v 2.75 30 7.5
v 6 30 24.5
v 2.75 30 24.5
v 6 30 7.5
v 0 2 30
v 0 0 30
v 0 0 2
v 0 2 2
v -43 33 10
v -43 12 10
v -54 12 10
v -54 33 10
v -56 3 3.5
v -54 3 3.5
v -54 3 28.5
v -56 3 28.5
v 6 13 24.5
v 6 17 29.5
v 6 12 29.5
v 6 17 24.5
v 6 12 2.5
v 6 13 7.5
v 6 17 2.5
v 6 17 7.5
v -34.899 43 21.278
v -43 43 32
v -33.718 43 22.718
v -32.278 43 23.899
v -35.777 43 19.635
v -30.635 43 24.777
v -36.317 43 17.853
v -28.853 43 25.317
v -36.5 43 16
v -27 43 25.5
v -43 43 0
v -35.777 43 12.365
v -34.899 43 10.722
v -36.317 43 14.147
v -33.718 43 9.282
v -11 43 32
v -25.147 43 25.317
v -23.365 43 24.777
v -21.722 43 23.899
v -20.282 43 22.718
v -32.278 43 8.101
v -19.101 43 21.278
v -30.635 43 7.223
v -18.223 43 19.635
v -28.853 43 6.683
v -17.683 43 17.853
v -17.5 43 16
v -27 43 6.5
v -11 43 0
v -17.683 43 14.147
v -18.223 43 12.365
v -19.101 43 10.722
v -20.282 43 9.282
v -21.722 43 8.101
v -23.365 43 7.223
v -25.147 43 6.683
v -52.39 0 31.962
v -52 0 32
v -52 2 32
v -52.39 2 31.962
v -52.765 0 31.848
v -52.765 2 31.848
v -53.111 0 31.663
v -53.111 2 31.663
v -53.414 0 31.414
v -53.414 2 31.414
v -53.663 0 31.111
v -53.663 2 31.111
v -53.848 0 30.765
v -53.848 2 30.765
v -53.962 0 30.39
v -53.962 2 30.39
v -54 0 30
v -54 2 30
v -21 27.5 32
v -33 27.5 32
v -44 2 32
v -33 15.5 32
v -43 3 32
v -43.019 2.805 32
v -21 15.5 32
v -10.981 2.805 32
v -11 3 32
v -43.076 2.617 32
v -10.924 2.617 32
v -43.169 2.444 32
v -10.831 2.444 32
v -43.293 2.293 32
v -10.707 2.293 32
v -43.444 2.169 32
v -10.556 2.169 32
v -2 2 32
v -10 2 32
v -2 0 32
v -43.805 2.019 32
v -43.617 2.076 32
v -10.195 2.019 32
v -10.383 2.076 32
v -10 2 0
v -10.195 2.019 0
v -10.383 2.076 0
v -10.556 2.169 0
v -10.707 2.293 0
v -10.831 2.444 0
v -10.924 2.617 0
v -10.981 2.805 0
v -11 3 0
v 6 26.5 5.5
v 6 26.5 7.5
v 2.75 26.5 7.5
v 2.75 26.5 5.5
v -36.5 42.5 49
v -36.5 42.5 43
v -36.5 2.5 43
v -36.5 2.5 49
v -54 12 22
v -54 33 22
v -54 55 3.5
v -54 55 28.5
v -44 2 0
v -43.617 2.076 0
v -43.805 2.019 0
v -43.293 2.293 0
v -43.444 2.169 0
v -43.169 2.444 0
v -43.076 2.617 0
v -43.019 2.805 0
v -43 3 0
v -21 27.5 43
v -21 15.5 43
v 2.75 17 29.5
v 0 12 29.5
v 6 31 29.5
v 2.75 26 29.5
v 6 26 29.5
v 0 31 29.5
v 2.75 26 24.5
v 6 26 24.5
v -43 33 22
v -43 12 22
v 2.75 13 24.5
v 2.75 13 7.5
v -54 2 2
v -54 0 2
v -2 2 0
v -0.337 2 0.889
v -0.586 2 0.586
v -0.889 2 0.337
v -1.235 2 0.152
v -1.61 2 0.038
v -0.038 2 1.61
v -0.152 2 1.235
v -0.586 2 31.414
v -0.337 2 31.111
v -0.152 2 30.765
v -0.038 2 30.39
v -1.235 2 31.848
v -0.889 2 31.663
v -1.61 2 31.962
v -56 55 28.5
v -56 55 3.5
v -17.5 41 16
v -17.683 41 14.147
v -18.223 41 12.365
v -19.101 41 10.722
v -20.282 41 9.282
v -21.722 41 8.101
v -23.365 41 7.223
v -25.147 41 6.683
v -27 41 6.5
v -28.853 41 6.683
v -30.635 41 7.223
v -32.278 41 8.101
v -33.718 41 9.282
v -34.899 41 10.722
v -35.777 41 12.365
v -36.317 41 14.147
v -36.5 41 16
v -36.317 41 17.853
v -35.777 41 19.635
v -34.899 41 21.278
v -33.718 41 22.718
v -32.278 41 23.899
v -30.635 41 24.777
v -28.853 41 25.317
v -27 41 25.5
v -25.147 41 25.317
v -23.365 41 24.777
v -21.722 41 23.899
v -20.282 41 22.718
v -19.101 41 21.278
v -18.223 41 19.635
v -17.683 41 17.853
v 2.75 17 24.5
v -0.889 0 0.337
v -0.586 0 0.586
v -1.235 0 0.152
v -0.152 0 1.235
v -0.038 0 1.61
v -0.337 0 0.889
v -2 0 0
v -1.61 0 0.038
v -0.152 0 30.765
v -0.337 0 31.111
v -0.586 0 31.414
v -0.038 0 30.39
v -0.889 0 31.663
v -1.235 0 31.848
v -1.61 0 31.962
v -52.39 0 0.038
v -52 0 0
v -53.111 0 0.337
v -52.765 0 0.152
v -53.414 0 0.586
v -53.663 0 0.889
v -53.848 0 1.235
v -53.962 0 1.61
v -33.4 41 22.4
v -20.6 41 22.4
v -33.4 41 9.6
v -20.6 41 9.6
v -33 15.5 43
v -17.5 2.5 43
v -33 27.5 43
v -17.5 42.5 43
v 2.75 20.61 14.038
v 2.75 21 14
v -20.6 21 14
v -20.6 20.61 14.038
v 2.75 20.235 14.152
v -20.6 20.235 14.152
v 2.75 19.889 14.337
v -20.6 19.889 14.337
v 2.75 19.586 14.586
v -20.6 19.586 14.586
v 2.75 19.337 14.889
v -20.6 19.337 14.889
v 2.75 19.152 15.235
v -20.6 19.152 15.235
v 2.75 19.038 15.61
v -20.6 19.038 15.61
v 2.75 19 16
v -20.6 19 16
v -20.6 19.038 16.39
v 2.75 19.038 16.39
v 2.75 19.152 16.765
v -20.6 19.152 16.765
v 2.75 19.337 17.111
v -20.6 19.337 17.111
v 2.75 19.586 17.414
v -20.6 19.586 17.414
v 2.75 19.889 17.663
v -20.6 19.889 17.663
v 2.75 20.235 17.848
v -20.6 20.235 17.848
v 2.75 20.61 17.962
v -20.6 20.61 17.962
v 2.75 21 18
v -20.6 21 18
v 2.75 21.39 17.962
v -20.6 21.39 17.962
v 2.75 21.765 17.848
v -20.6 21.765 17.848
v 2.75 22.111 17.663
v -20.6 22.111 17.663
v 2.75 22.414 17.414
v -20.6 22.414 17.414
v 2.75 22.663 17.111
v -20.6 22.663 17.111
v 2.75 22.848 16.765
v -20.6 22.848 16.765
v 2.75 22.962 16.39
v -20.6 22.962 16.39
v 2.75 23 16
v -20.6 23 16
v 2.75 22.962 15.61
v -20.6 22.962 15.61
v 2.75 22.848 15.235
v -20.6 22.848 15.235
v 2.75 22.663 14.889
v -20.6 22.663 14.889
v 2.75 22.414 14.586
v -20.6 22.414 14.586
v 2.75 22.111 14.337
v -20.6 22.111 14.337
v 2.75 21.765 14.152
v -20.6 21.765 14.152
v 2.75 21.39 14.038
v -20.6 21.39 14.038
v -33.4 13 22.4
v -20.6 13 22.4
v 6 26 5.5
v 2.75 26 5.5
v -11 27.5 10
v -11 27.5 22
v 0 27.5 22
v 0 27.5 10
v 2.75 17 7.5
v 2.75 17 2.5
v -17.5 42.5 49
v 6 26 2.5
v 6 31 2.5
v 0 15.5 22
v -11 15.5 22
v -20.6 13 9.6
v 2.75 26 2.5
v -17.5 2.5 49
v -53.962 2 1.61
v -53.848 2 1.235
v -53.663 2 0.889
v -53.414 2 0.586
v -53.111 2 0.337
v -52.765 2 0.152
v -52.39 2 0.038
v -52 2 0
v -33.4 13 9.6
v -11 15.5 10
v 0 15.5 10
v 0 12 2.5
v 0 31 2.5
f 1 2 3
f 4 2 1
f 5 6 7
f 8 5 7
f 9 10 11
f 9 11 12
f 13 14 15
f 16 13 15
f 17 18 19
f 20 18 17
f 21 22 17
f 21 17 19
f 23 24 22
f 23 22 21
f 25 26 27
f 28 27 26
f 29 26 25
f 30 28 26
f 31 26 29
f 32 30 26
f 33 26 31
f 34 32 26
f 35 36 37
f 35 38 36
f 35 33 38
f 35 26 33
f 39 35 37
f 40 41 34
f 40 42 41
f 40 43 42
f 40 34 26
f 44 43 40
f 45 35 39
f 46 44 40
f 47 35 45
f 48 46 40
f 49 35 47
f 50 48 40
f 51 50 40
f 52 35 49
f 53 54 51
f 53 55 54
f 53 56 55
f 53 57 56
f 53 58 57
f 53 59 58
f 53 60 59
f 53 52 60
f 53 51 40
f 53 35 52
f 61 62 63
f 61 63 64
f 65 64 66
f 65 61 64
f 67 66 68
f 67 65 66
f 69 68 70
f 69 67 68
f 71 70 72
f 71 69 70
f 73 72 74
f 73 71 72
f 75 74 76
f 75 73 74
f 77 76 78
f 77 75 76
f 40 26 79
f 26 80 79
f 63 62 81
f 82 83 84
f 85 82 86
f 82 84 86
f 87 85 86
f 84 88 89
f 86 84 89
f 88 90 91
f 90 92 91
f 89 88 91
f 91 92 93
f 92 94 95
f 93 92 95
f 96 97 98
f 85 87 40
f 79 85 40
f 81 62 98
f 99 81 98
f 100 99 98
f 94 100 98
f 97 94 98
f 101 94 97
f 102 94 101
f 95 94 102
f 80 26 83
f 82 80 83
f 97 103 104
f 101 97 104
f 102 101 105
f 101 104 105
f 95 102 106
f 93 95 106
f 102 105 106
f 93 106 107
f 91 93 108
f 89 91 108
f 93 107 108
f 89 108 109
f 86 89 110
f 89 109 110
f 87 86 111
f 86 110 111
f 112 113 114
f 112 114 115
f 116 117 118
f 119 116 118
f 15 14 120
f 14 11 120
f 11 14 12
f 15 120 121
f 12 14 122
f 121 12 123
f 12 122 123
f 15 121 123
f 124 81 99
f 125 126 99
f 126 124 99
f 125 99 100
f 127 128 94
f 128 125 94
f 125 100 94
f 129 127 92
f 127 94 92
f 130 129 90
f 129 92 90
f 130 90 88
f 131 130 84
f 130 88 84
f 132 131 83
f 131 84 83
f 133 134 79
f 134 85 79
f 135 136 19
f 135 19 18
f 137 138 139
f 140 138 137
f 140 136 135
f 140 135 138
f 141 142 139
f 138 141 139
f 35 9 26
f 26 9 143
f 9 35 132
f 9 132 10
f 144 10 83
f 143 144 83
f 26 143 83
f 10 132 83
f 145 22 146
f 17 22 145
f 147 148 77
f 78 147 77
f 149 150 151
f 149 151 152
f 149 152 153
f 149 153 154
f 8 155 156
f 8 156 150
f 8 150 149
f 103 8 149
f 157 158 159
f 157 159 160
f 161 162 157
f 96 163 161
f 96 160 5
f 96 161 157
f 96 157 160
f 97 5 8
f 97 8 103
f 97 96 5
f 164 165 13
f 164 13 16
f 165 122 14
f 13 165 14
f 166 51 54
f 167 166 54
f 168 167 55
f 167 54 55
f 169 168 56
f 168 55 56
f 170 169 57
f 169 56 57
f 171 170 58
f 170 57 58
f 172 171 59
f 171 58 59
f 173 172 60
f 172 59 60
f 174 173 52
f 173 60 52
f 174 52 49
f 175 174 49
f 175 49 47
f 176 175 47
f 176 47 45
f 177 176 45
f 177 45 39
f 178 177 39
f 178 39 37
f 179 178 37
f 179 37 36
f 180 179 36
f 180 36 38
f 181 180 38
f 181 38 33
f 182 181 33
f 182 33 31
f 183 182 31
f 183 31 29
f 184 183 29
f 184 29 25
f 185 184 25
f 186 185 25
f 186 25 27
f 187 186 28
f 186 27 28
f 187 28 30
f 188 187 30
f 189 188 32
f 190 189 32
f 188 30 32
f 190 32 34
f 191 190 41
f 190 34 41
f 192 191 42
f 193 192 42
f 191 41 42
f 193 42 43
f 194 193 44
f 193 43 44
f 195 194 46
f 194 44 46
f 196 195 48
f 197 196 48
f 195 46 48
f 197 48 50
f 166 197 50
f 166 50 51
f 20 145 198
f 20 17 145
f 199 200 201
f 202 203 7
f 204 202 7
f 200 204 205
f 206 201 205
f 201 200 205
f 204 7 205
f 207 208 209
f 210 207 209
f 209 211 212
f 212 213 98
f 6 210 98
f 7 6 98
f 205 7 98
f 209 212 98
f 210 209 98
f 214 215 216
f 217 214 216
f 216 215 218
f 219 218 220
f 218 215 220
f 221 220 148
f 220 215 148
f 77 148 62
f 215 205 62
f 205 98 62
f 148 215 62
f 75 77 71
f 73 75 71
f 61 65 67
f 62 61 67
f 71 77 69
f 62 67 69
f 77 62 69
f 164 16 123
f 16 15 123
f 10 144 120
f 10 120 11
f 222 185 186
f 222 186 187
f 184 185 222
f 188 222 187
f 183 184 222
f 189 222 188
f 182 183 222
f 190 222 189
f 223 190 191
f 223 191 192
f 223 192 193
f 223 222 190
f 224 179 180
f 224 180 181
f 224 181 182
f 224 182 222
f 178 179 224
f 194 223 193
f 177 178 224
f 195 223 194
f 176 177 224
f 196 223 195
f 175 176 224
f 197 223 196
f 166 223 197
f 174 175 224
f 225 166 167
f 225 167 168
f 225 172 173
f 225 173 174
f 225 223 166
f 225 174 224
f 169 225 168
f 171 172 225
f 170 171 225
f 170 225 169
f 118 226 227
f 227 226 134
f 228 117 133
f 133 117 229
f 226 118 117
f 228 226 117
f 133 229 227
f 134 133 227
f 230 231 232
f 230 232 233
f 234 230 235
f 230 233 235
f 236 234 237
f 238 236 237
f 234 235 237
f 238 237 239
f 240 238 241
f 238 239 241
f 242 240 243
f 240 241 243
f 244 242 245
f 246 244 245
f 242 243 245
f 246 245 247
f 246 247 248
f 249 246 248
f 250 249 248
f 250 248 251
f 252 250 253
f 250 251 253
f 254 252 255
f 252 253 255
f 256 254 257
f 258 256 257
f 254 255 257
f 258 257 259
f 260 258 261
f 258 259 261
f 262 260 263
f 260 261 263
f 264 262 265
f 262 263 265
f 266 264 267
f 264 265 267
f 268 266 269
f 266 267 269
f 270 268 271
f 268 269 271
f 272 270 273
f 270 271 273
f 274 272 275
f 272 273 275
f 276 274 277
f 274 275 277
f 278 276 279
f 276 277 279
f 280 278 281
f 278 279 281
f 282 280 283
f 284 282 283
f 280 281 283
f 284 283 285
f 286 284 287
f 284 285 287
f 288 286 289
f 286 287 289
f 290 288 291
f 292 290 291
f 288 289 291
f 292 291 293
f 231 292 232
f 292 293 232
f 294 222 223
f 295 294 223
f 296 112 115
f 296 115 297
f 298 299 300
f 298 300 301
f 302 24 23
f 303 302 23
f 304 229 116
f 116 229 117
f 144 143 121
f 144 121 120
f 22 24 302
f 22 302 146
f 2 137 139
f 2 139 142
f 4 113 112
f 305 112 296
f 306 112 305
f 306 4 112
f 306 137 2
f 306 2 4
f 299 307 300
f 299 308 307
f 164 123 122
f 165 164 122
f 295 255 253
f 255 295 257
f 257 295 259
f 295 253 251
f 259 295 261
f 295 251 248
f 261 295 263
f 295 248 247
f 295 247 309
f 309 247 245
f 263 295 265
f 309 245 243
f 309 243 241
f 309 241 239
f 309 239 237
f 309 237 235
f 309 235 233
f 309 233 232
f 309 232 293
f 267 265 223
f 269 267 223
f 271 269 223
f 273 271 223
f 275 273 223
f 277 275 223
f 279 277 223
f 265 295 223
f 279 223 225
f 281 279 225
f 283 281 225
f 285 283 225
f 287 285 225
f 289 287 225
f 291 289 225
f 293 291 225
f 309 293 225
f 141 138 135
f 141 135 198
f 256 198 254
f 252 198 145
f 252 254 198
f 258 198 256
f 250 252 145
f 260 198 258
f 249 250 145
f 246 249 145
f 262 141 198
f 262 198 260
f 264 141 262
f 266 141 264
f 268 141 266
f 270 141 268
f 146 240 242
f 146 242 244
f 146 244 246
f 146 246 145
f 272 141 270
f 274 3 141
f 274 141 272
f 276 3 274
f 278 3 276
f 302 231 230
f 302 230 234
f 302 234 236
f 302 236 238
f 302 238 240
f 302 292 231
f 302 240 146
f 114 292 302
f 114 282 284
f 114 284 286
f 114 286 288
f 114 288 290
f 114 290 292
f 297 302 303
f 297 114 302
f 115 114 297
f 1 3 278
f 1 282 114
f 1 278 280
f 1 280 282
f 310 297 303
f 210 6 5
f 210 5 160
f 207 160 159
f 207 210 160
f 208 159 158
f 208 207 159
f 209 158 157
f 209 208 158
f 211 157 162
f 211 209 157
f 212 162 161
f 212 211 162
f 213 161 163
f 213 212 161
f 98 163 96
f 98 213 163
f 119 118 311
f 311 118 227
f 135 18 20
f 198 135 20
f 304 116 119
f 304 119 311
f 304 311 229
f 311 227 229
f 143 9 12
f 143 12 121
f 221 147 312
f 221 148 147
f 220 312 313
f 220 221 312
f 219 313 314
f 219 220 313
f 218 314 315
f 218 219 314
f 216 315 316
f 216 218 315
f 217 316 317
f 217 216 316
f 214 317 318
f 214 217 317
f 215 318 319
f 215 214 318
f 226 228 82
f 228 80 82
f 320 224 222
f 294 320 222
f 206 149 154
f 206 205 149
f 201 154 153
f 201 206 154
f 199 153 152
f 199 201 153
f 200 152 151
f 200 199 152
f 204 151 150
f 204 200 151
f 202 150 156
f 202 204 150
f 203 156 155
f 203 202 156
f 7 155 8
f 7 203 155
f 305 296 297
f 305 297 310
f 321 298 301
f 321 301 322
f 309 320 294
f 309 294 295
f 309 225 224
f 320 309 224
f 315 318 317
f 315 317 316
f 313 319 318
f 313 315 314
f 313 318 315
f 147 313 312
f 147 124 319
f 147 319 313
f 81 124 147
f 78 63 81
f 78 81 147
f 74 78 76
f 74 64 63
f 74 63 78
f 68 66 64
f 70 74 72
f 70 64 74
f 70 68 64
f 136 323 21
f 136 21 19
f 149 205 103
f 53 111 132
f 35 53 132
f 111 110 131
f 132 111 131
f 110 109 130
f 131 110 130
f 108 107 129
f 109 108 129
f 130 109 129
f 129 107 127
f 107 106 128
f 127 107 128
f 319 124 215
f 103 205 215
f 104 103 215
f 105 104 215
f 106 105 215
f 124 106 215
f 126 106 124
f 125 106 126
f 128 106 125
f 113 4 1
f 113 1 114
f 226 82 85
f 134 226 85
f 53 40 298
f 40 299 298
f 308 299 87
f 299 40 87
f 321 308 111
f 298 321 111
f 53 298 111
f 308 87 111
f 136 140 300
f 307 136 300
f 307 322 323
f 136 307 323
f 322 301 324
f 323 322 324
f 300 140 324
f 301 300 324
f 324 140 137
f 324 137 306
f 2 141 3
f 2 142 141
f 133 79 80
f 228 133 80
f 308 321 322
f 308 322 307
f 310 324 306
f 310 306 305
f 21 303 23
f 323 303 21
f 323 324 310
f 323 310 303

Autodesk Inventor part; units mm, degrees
ref_plane "YZ Plane" through (0, 0, 0) normal (1, 0, 0) x (0, 1, 0)
ref_plane "XZ Plane" through (0, 0, 0) normal (0, 1, 0) x (-1, 0, 0)
ref_plane "XY Plane" through (0, 0, 0) normal (0, 0, 1) x (1, 0, 0)
sketch "Sketch1" plane through (0, 0, 0) normal (1, 0, 0) x (0, 1, 0)
  point P0 (0, 0)
sketch "Sketch2" plane through (0, 0, 0) normal (1, 0, 0) x (0, 1, 0)
  point P0 (0, 0)
sketch "Sketch3" plane through (0, 0, 0) normal (0, 1, 0) x (-1, 0, 0)
  point P0 (0, 0)
sketch "Sketch4" plane through (0, 0, 0) normal (0, 1, 0) x (-1, 0, 0)
  line L0 (52, 32) -> (2, 32)
  line L1 (0, 30) -> (0, 2)
  line L2 (2, 0) -> (52, 0)
  line L3 (54, 2) -> (54, 30)
  arc A0 (2, 32) -> (0, 30) centre (2, 30) ccw
  arc A1 (0, 2) -> (2, 0) centre (2, 2) ccw
  arc A2 (52, 0) -> (54, 2) centre (52, 2) ccw
  arc A3 (54, 30) -> (52, 32) centre (52, 30) ccw
  point P0 (0, 0)
  dimension "d0" = 2
extrude "Extrusion1" add sketch "Sketch4" along normal blind 2
sketch "Sketch5" plane through (0, 2, 0) normal (0, 1, 0) x (1, 0, 0)
  point P0 (0, 0)
sketch "Sketch6" plane through (0, 2, 0) normal (0, 1, 0) x (1, 0, 0)
  point P0 (0, 0)
sketch "Sketch7" plane through (0, 2, 0) normal (0, 1, 0) x (1, 0, 0)
  line L0 (-11, 0) -> (-43, 0)
  line L1 (-43, 0) -> (-43, -32)
  line L2 (-43, -32) -> (-11, -32)
  line L3 (-11, -32) -> (-11, 0)
  point P0 (0, 0)
extrude "Extrusion2" add sketch "Sketch7" along normal blind 41
fillet "Fillet1" radius 1 1 edges at (-11, 2, 16)
fillet "Fillet2" radius 1 1 edges at (-43, 2, 16)
sketch "Sketch8" plane through (-52, 0, 32) normal (0, 0, 1) x (1, 0, 0)
  point P0 (52, 0)
sketch "Sketch9" plane through (-52, 0, 32) normal (0, 0, 1) x (1, 0, 0)
  line L0 (19, 15.5) -> (31, 15.5)
  line L1 (31, 15.5) -> (31, 27.5)
  line L2 (31, 27.5) -> (19, 27.5)
  line L3 (19, 27.5) -> (19, 15.5)
  point P0 (52, 0)
sketch "Sketch10" plane through (-11, 43, 32) normal (1, 0, 0) x (0, 0, -1)
  line L0 (10, -15.5) -> (22, -15.5)
  line L1 (22, -15.5) -> (22, -27.5)
  line L2 (22, -27.5) -> (10, -27.5)
  line L3 (10, -27.5) -> (10, -15.5)
  point P0 (32, -43)
sketch "Sketch11" plane through (0, 43, 0) normal (0, 1, 0) x (1, 0, 0)
  line L0 (-43, -32) -> (-43, 0) projected
  line L1 (-11, 0) -> (-43, 0)
  line L2 (-2, 0) -> (-52, 0) projected
  circle A0 centre (-27, -16) radius 9.5
  point P0 (0, 0)
sketch "Sketch12" plane through (0, 43, 0) normal (0, 1, 0) x (1, 0, 0)
  point P0 (0, 0)
sketch "Sketch13" plane through (0, 43, 0) normal (0, 1, 0) x (1, 0, 0)
  point P0 (0, 0)
extrude "Extrusion3" cut sketch "Sketch11" along normal blind 2
sketch "Sketch14" plane through (0, 43, 0) normal (0, 1, 0) x (1, 0, 0)
  line L0 (-43, 0) -> (-43, -32) projected
  line L1 (-11, -32) -> (-11, 0) projected
  line L2 (-10, -32) -> (-10, 0) projected
  point P0 (0, 0)
sketch "Sketch15" plane through (0, 43, 0) normal (0, 1, 0) x (1, 0, 0)
  line L0 (-20.6, -9.6) -> (-33.4, -9.6)
  line L1 (-33.4, -9.6) -> (-33.4, -22.4)
  line L2 (-33.4, -22.4) -> (-20.6, -22.4)
  line L3 (-20.6, -22.4) -> (-20.6, -9.6)
  point P0 (0, 0)
sketch "Sketch16" plane through (0, 43, 0) normal (0, 1, 0) x (1, 0, 0)
  point P0 (0, 0)
sketch "Sketch17" plane through (0, 43, 0) normal (0, 1, 0) x (1, 0, 0)
  point P0 (0, 0)
extrude "Extrusion4" cut sketch "Sketch15" against normal blind 30
sketch "Sketch18" plane through (0, 43, 0) normal (0, 1, 0) x (1, 0, 0)
  point P0 (0, 0)
sketch "Sketch19" plane through (0, 43, 0) normal (0, 1, 0) x (1, 0, 0)
  circle A0 centre (-27, -16) radius 9.5
  point P0 (0, 0)
extrude "Extrusion5" cut sketch "Sketch19" against normal blind 2
sketch "Sketch20" plane through (-43, 43, 0) normal (-1, 0, 0) x (0, 0, 1)
  line L0 (10, -10) -> (22, -10)
  line L1 (22, -10) -> (22, -31)
  line L2 (22, -31) -> (10, -31)
  line L3 (10, -31) -> (10, -10)
  point P0 (0, -43)
extrude "Extrusion6" add sketch "Sketch10" along normal blind 11
extrude "Extrusion7" add sketch "Sketch9" along normal blind 11
extrude "Extrusion8" add sketch "Sketch20" along normal blind 11
sketch "Sketch21" plane through (0, 43, 32) normal (1, 0, 0) x (0, 0, -1)
  line L0 (2.5, -12) -> (29.5, -12)
  line L1 (29.5, -12) -> (29.5, -31)
  line L2 (29.5, -31) -> (2.5, -31)
  line L3 (2.5, -31) -> (2.5, -12)
  point P0 (32, -43)
sketch "Sketch22" plane through (-52, 0, 43) normal (0, 0, 1) x (1, 0, 0)
  line L0 (15.5, 2.5) -> (34.5, 2.5)
  line L1 (34.5, 2.5) -> (34.5, 42.5)
  line L2 (34.5, 42.5) -> (15.5, 42.5)
  line L3 (15.5, 42.5) -> (15.5, 2.5)
  point P0 (52, 0)
extrude "Extrusion9" add sketch "Sketch21" along normal blind 6
extrude "Extrusion10" add sketch "Sketch22" along normal blind 6
sketch "Sketch23" plane through (-54, 43, 0) normal (-1, 0, 0) x (0, 0, 1)
  line L0 (3.5, -40) -> (28.5, -40)
  line L1 (28.5, -40) -> (28.5, 12)
  line L2 (28.5, 12) -> (3.5, 12)
  line L3 (3.5, 12) -> (3.5, -40)
  point P0 (0, -43)
extrude "Extrusion11" add sketch "Sketch23" along normal blind 2
sketch "Sketch24" plane through (6, 43, 32) normal (1, 0, 0) x (0, 0, -1)
  line L0 (16, -22) -> (-30.5795, -61.0635)
  point P0 (32, -43)
hole "Hole1" at (6, 21, 16) direction (-1, 0, 0) diameter 4 depth 27 tip angle 118
sketch "Sketch25" plane through (6, 43, 32) normal (1, 0, 0) x (0, 0, -1)
  line L0 (7.5, -17) -> (7.5, -13)
  line L1 (29.5, -12) -> (2.5, -12) projected
  line L2 (7.5, -13) -> (24.5, -13)
  line L3 (24.5, -13) -> (24.5, -16.5)
  line L4 (24.5, -16.5) -> (26.5, -16.5)
  line L5 (26.5, -16.5) -> (26.5, -17)
  line L6 (26.5, -17) -> (28.5, -17)
  line L7 (28.5, -26) -> (24.5, -26)
  line L8 (24.5, -26) -> (24.5, -30)
  line L9 (24.5, -30) -> (7.5, -30)
  line L10 (22.4, -30) -> (9.6, -30) projected
  line L11 (7.5, -30) -> (7.5, -26)
  line L12 (7.5, -26) -> (3.5, -26)
  line L13 (3.5, -17) -> (7.5, -17)
  line L14 (28.5, -17) -> (29.5, -17)
  line L15 (29.5, -31) -> (29.5, -12) projected
  line L16 (28.5, -26) -> (29.5, -26)
  line L17 (29.5, -26) -> (29.5, -17)
  line L18 (3.5, -17) -> (2.5, -17)
  line L19 (2.5, -17) -> (2.5, -26)
  line L20 (2.5, -26) -> (3.5, -26)
  point P0 (32, -43)
extrude "Extrusion12" cut sketch "Sketch25" against normal blind 3.25
properties part number "Cuvette Holder"
